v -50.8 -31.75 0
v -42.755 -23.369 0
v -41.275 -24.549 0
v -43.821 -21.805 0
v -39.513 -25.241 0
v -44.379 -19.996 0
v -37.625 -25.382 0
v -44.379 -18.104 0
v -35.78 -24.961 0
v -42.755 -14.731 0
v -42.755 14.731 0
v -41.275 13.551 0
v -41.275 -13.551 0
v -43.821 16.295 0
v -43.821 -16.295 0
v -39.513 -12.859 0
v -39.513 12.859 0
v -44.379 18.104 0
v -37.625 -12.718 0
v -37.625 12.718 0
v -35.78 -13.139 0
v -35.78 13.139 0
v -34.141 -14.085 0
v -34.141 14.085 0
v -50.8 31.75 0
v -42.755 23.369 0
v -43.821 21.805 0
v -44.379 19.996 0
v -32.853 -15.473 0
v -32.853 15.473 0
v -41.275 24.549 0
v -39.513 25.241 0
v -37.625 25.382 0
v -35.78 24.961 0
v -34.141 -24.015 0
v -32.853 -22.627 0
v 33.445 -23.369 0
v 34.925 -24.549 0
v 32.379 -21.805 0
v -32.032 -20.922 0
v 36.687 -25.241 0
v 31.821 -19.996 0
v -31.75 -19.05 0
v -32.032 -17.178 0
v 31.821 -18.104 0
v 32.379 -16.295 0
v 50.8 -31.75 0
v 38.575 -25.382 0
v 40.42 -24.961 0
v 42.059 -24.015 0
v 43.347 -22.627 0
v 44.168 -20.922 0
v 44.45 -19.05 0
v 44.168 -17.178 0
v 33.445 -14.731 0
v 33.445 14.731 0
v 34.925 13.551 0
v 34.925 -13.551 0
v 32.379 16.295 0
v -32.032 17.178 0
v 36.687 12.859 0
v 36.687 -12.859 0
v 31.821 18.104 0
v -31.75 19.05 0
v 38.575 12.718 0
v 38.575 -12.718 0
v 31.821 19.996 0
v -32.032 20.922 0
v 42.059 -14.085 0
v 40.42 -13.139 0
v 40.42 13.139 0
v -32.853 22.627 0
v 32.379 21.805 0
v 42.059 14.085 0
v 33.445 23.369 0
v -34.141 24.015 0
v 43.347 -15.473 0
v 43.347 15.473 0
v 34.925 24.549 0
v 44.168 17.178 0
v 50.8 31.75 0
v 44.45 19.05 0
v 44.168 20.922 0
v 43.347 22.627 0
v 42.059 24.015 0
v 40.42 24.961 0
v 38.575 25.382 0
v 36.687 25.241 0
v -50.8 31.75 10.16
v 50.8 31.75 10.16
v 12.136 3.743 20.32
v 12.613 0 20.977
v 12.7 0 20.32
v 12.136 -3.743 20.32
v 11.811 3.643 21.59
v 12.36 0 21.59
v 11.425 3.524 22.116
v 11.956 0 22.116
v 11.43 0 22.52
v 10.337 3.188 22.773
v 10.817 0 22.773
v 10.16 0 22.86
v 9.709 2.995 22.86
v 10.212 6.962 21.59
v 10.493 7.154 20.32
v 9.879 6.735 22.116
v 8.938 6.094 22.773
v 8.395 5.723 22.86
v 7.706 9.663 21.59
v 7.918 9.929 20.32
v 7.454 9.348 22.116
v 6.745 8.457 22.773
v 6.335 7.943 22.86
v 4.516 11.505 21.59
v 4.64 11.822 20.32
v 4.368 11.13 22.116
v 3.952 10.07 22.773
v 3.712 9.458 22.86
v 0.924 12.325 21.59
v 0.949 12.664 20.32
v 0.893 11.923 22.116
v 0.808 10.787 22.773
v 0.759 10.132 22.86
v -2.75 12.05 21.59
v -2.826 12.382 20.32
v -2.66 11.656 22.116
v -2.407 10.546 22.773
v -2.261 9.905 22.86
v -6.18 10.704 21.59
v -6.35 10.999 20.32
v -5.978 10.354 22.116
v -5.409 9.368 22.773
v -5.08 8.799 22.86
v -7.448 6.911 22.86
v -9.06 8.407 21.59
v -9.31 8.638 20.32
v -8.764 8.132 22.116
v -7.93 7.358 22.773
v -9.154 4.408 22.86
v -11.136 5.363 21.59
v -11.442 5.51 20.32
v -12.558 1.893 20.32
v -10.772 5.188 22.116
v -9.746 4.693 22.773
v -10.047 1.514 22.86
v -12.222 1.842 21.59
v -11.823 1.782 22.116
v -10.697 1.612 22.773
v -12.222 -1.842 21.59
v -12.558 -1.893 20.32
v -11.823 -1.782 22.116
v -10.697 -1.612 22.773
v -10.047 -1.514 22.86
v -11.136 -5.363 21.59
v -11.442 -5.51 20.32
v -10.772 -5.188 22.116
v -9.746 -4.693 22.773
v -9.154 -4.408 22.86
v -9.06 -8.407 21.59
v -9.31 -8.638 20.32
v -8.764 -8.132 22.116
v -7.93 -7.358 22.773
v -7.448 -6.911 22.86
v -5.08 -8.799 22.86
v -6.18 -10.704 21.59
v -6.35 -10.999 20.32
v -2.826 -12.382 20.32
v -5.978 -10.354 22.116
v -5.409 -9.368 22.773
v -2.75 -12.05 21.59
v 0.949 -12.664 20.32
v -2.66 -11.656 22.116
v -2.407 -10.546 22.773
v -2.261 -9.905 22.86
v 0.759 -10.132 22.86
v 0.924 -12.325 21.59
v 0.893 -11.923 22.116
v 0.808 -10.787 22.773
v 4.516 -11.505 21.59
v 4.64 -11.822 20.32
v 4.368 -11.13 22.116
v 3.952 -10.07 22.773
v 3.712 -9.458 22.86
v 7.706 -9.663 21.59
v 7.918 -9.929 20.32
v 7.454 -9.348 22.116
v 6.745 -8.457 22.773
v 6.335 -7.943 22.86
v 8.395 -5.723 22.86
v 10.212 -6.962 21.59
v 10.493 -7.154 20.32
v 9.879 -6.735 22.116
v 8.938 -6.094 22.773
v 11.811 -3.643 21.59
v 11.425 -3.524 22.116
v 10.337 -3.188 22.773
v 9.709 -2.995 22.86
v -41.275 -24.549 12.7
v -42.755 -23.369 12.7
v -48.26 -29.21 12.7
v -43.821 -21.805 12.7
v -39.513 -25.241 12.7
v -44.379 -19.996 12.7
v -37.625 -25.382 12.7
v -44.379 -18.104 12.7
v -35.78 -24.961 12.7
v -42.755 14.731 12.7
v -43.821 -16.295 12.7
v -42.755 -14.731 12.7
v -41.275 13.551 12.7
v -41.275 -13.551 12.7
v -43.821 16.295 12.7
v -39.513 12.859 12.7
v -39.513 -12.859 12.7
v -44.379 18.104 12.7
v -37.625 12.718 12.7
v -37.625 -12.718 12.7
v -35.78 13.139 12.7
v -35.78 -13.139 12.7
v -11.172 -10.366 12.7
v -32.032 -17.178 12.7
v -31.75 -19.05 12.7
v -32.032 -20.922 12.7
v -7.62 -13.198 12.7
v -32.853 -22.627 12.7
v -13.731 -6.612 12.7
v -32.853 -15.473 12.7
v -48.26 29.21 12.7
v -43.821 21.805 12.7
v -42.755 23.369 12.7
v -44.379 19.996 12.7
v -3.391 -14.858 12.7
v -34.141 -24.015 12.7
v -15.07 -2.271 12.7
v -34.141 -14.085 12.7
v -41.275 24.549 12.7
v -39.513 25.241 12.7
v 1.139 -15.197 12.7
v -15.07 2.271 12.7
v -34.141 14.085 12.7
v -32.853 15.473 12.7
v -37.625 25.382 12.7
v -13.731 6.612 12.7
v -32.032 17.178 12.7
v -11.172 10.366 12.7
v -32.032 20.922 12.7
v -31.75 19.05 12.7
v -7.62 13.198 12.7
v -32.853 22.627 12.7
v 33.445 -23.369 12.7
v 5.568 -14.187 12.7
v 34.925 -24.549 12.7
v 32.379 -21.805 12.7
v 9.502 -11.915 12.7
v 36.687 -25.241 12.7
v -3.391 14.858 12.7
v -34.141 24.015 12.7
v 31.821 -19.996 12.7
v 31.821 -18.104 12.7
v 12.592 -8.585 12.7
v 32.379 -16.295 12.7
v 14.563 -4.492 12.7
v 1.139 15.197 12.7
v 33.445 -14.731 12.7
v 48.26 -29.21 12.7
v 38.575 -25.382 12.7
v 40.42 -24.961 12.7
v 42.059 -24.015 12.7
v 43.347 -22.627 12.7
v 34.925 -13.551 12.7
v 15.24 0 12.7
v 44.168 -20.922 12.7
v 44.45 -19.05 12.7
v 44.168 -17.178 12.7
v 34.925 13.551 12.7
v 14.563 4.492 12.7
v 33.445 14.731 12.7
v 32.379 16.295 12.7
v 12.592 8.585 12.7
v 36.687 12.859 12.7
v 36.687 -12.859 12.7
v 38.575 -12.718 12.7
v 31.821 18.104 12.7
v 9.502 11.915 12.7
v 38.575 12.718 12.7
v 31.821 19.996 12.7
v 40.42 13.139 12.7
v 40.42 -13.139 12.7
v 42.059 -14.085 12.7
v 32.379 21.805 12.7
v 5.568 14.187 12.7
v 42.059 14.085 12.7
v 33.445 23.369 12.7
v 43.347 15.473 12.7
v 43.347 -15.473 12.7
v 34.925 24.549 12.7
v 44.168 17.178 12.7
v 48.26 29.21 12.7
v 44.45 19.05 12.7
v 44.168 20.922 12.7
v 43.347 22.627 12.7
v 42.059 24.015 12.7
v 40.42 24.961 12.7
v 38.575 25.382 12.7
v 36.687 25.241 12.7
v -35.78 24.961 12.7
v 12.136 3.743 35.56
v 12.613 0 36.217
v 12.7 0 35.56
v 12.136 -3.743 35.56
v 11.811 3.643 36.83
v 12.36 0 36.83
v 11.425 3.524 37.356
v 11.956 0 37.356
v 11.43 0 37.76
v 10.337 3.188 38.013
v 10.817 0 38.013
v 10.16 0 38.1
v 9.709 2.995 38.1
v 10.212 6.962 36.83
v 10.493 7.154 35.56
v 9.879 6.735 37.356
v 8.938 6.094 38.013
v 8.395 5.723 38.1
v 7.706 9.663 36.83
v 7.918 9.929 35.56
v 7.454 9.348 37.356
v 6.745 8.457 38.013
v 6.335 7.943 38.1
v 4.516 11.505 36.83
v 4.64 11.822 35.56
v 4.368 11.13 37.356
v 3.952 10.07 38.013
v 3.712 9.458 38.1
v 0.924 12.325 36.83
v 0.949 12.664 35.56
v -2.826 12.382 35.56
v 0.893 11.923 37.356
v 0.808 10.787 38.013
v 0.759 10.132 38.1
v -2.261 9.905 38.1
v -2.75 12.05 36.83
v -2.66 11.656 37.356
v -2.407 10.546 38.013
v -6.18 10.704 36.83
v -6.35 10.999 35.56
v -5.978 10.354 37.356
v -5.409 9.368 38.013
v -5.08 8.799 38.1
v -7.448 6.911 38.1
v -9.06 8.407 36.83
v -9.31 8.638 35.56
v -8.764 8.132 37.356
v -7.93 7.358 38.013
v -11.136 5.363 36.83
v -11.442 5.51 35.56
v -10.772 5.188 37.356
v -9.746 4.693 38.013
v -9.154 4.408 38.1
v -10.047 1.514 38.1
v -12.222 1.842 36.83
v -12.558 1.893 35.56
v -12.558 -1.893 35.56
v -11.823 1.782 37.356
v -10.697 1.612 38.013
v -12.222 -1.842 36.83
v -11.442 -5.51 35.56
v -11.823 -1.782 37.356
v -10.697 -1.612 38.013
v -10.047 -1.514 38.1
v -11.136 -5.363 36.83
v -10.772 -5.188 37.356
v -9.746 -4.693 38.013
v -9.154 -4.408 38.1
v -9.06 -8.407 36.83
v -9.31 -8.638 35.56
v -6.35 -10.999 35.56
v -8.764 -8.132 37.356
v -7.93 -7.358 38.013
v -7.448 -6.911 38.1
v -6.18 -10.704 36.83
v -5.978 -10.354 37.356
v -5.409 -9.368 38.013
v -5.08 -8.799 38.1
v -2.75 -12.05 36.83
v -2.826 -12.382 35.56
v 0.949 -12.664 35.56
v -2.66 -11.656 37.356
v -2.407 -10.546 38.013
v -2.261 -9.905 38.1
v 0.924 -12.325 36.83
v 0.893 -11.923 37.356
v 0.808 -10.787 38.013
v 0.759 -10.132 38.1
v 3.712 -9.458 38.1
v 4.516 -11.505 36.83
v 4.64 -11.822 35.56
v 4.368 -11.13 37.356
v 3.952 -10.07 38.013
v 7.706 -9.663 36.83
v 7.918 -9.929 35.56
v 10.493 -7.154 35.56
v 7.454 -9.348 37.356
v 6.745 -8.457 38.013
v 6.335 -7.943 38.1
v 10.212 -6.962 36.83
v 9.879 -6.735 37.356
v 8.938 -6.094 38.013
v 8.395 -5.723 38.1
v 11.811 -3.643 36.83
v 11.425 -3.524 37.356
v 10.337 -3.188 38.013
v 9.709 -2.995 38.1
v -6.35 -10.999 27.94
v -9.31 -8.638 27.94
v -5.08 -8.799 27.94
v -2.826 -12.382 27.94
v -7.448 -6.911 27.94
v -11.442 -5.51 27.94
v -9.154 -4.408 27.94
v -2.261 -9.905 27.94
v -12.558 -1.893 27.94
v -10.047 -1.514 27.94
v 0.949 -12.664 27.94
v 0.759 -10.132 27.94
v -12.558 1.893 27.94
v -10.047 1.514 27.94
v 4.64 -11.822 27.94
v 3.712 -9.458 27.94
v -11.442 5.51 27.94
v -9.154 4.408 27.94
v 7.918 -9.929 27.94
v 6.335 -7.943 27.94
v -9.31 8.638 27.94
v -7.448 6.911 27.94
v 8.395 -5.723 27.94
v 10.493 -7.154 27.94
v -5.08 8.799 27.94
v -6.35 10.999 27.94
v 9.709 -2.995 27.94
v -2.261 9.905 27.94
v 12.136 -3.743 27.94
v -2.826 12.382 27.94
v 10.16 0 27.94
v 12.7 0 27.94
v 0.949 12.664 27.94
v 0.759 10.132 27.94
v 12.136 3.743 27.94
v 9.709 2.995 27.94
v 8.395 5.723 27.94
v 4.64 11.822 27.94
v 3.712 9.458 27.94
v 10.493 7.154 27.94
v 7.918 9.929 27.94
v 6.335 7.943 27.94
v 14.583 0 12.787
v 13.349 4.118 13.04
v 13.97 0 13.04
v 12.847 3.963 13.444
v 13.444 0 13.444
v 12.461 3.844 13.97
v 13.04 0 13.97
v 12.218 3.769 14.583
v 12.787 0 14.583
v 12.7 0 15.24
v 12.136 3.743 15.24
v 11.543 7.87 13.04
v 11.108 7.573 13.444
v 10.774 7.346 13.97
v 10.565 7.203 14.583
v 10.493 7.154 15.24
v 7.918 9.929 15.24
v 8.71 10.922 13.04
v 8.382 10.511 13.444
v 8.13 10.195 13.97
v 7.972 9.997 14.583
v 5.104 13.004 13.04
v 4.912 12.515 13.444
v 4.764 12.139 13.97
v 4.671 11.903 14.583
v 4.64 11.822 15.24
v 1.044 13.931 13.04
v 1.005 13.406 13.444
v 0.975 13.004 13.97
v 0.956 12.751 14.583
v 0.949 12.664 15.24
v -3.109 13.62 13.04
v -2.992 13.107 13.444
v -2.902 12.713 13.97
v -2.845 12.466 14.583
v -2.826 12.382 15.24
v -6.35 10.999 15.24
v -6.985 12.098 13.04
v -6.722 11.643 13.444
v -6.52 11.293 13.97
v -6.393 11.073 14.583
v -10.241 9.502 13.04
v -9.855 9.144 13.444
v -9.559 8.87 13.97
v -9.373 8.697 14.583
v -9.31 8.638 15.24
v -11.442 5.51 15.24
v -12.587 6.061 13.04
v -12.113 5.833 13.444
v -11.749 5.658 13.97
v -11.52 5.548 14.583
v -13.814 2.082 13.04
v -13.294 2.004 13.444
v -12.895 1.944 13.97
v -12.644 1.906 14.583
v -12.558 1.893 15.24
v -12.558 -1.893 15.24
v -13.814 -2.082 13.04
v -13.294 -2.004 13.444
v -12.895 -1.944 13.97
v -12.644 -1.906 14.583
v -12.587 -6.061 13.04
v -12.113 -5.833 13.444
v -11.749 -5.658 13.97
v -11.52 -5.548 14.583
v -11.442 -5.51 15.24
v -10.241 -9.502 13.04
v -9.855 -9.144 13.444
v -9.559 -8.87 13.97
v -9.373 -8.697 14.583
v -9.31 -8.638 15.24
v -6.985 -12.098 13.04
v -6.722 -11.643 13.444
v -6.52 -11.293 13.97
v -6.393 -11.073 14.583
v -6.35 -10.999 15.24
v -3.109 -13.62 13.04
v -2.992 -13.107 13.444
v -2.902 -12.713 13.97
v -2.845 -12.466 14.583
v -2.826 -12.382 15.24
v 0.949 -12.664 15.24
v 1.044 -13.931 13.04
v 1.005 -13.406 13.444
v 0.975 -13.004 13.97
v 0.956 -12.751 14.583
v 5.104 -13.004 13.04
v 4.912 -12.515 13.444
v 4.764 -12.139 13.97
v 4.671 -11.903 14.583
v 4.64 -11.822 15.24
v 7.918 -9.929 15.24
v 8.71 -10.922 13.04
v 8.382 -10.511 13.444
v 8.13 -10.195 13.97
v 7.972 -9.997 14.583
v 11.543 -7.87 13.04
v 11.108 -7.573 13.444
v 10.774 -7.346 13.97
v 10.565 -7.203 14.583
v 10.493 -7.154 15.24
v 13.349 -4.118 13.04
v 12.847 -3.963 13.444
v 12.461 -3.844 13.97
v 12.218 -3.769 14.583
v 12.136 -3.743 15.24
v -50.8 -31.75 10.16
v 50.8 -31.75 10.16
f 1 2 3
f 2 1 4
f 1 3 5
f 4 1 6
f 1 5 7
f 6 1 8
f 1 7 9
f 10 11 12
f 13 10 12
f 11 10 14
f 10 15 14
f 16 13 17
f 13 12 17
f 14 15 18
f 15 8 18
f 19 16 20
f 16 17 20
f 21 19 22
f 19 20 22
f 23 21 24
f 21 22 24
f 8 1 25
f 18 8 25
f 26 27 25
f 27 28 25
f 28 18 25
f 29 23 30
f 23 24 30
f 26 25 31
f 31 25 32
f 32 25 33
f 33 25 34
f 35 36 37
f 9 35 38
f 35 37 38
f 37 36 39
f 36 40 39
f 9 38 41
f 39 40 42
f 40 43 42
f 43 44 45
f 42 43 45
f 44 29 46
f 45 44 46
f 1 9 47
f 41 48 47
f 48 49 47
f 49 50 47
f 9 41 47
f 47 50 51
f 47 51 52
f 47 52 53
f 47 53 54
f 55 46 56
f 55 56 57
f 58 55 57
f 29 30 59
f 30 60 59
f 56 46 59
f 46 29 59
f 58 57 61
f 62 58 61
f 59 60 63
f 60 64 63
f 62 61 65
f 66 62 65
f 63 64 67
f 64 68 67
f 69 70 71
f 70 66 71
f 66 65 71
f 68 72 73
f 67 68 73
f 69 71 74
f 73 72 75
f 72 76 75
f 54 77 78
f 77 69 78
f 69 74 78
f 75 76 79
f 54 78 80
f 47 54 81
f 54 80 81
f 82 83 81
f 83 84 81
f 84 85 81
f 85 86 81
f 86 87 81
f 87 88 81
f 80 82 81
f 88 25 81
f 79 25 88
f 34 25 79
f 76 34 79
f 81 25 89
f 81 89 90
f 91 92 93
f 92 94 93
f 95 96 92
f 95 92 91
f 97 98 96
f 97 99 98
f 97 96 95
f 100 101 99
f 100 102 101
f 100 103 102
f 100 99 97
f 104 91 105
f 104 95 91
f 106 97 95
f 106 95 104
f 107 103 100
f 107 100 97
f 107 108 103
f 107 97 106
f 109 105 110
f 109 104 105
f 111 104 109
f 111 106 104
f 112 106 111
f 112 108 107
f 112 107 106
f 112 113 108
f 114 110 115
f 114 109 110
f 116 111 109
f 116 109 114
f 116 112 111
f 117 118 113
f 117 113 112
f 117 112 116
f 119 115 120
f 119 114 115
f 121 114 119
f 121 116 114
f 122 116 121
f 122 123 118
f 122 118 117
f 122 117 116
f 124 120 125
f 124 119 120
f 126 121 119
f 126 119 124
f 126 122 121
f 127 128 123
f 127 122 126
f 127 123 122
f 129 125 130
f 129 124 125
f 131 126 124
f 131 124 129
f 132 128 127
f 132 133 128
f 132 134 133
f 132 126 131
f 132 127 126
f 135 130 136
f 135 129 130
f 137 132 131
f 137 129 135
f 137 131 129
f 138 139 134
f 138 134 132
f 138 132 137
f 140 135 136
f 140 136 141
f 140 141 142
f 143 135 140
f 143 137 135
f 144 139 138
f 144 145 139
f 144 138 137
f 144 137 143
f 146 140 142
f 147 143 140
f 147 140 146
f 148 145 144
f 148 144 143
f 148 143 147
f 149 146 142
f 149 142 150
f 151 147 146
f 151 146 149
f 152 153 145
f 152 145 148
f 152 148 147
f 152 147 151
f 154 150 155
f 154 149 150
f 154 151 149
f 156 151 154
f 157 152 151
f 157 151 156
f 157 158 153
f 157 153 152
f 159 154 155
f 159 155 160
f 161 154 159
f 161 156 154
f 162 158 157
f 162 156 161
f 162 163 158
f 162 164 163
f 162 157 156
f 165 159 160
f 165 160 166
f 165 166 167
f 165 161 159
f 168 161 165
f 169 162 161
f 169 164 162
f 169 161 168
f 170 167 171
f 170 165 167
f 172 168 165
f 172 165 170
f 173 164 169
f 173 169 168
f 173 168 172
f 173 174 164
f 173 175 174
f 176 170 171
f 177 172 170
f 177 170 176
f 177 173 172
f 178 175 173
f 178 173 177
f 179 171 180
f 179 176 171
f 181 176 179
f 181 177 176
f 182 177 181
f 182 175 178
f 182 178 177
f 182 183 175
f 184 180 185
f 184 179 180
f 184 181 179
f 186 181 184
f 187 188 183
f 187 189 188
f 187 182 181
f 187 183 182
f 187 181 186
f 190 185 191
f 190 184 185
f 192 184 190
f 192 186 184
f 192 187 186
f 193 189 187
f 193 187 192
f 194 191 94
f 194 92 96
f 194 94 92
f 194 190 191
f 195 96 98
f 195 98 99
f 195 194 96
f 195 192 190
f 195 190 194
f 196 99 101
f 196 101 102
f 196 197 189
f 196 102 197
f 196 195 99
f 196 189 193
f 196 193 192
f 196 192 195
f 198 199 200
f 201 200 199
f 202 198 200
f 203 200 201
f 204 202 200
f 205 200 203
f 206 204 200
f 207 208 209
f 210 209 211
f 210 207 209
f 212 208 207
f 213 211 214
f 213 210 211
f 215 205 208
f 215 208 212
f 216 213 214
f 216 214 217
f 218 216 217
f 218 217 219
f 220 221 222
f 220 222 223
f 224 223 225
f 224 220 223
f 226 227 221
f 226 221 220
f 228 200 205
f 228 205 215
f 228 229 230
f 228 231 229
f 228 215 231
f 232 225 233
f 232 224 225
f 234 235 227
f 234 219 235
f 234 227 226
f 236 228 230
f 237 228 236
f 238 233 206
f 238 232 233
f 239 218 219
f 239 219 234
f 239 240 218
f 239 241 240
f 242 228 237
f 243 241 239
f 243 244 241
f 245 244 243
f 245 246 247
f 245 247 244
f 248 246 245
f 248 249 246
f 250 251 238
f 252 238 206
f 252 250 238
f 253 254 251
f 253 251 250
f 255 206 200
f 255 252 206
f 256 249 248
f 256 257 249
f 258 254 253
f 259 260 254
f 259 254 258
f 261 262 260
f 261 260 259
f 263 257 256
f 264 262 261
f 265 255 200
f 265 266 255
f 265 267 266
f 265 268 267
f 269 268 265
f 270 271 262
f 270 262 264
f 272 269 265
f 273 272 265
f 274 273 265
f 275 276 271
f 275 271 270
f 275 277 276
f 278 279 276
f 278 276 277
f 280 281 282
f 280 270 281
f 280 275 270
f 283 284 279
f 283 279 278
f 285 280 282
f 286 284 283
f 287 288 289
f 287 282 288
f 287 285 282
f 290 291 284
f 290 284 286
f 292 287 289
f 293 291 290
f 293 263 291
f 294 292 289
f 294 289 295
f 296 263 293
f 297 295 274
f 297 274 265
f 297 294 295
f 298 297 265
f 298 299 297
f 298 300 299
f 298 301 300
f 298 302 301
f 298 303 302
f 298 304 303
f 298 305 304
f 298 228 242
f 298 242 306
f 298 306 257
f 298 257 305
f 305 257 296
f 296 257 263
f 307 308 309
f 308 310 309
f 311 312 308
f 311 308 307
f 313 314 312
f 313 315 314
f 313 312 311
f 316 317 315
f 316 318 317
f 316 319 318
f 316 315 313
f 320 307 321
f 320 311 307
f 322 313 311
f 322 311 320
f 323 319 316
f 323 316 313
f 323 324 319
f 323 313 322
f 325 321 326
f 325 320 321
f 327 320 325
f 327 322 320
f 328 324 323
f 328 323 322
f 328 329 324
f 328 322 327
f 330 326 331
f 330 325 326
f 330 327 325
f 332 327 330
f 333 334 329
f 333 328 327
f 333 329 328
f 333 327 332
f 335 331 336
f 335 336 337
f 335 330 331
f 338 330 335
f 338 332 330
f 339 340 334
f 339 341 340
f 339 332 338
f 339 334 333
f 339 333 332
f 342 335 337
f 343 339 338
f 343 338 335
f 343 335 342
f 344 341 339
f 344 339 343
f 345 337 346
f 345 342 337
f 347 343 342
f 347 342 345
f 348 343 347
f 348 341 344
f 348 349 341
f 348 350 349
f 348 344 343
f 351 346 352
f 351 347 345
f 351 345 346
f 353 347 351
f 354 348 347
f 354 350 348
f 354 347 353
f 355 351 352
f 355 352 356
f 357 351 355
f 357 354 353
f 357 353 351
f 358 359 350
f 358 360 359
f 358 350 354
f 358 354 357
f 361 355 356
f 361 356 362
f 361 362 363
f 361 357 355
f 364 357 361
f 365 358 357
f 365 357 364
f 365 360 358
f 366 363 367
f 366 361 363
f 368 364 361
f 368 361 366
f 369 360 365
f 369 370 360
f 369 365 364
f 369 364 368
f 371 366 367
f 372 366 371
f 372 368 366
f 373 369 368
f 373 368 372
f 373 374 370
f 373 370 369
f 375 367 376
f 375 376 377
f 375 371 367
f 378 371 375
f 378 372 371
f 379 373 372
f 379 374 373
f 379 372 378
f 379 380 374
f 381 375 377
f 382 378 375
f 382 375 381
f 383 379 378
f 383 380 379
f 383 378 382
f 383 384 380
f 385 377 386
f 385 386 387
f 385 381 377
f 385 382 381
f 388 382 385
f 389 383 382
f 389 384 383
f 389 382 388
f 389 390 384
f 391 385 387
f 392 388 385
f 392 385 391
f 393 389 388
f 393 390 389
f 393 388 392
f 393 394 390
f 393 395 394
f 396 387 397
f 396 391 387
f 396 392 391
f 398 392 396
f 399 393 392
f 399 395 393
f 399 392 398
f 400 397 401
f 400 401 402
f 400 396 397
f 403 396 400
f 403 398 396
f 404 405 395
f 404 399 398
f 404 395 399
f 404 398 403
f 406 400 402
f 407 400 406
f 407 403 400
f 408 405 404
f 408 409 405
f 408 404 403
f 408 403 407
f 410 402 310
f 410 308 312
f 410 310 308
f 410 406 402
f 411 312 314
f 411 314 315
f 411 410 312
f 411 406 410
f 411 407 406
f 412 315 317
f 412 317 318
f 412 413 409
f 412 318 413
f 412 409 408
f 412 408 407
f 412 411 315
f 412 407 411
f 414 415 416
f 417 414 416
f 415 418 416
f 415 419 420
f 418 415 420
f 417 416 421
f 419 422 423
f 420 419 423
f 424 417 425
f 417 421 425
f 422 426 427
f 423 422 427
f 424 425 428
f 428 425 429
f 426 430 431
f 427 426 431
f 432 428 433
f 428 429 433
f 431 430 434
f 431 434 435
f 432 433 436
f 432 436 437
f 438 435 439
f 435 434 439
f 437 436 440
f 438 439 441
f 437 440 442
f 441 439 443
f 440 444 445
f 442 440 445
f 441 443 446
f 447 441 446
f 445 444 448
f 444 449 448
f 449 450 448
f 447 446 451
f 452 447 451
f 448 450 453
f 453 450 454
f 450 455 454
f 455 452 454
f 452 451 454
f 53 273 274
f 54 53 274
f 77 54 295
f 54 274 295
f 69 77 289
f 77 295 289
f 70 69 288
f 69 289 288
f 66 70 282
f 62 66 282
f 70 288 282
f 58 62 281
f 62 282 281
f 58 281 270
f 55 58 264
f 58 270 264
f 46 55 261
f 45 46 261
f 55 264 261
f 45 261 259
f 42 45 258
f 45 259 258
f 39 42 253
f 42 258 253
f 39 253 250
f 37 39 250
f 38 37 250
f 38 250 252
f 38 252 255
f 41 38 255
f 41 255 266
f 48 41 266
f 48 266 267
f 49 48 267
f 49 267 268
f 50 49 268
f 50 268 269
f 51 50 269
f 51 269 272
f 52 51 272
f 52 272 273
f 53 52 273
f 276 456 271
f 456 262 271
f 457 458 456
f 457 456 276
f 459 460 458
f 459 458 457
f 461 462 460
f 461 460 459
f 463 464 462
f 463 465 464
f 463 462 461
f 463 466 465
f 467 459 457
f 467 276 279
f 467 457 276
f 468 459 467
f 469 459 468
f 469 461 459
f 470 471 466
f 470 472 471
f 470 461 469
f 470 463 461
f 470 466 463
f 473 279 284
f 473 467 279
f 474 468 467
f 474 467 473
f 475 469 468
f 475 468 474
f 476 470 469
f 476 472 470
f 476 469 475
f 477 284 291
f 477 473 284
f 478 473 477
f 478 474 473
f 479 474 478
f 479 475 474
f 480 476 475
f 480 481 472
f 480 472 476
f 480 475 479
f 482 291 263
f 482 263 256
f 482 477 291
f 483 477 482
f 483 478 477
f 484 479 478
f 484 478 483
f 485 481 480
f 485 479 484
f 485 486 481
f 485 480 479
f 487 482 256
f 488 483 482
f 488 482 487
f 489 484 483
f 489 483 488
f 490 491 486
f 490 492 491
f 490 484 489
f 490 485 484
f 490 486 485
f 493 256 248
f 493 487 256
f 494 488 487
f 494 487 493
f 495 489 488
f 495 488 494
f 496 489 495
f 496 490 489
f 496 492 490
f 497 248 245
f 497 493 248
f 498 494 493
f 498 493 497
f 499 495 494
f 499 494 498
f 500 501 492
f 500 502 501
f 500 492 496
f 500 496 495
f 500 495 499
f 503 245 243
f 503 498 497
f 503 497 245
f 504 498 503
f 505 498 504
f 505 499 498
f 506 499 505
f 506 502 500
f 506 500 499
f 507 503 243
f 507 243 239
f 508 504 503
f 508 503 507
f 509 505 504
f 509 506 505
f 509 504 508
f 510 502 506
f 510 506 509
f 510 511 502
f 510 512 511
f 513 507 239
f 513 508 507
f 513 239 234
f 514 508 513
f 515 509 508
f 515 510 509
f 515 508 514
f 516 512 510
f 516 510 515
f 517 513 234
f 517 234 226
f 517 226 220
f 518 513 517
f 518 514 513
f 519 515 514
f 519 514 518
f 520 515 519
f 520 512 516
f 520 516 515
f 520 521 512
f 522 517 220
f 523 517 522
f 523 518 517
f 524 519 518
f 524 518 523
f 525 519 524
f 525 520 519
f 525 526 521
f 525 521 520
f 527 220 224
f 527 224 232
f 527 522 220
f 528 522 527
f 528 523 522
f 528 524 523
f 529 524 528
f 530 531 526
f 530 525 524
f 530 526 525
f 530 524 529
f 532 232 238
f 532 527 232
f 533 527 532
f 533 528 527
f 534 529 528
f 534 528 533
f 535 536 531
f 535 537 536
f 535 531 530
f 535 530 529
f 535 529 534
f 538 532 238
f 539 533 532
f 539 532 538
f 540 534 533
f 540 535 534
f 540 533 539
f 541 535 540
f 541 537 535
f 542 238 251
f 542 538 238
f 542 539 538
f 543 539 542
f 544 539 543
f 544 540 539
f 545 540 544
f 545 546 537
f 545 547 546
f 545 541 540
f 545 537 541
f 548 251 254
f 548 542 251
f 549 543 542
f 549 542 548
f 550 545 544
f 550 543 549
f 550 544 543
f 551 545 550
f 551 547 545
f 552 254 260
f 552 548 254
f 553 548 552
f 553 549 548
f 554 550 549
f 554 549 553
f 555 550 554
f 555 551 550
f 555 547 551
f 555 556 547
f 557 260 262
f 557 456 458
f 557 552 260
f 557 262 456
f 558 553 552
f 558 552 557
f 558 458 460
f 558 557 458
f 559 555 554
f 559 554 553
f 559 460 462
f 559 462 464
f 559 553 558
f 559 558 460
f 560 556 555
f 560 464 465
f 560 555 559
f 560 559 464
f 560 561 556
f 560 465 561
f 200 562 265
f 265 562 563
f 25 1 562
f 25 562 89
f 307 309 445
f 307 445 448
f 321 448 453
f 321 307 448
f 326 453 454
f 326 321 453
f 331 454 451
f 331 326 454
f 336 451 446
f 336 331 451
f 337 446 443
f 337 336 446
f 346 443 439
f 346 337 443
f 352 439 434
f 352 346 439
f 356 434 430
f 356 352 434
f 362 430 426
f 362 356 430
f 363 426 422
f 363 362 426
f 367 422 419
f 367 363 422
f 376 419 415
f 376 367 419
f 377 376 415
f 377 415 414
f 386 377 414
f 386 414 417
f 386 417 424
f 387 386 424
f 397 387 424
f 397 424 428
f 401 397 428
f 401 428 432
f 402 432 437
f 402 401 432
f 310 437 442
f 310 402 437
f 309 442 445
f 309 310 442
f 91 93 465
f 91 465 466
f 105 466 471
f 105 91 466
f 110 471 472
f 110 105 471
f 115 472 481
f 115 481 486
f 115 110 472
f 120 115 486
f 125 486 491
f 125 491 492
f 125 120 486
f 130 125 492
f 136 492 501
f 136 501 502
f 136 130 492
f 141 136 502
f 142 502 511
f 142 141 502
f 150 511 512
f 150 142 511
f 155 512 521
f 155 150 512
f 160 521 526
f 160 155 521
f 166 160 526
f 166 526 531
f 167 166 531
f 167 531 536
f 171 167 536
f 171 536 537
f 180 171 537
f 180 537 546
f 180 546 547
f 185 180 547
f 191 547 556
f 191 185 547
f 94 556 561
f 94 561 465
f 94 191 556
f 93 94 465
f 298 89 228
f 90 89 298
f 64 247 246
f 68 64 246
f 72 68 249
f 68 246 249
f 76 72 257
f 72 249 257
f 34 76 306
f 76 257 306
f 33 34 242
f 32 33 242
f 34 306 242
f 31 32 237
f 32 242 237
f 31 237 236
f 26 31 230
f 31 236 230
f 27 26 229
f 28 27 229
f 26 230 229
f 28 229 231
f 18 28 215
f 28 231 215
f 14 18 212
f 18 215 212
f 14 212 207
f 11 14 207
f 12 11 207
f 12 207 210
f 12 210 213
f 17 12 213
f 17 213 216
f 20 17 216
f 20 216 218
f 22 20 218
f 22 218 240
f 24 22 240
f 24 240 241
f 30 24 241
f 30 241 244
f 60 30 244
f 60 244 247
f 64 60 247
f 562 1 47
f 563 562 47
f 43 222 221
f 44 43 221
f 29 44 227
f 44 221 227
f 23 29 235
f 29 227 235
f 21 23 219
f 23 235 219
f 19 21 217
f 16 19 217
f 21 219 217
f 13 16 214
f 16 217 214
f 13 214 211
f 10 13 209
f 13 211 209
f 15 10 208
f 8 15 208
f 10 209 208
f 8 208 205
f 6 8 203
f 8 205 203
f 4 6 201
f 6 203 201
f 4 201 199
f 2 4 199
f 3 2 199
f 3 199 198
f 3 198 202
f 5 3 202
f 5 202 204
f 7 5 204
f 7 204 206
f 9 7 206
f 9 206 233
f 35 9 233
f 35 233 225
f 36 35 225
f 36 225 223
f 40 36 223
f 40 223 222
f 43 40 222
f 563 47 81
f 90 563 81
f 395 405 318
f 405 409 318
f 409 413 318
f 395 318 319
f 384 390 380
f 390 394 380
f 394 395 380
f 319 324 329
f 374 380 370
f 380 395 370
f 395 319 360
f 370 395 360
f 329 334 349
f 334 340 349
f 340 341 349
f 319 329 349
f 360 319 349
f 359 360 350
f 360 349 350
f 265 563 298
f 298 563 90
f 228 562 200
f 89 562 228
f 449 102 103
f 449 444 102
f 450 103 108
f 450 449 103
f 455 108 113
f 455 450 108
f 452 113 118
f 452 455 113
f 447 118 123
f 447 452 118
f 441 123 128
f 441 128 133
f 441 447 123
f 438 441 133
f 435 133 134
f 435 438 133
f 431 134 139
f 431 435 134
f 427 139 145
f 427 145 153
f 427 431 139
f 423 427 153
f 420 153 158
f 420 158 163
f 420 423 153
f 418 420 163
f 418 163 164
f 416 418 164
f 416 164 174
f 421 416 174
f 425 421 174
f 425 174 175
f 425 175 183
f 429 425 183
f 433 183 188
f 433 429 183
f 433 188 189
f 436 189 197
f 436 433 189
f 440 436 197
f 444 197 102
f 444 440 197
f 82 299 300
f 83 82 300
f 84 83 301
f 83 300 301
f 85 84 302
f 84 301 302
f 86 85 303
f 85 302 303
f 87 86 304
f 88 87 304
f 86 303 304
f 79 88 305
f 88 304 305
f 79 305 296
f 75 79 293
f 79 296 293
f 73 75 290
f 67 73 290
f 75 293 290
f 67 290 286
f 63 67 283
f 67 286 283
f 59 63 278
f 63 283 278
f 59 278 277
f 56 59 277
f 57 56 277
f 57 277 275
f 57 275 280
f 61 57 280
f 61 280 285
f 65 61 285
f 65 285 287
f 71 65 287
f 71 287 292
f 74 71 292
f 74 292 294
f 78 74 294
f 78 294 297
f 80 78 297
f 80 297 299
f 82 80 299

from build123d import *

# Parameters (mm, degrees)
F0_W     = 101.6
F0_H     = 63.5
F1_DEPTH = 12.7
F2_R     = 6.35
F3_DEPTH = 12.701
F4_W     = 12.7
F4_H     = 25.4
F6_W     = 4.7343277841
F6_H     = 5.08
F6_W_2   = 2.54
F8_R     = 2.53999
F9_R     = 2.54
F10_SIZE = 2.54


# Not quite as in the source:
# - a fillet or chamfer is up to 0.001 mm smaller than in the source, because OpenCascade refuses the exact size


with BuildPart() as f1:
    # F0 (on Top) → F1 (new body)
    with BuildSketch(Plane.XY):
        Rectangle(F0_W, F0_H)
    extrude(amount=F1_DEPTH)

    # F2 (on face) → F3 (cut, through all)
    with BuildSketch(Plane.XY.offset(12.7)):
        with Locations((-38.1, 19.05)):
            Circle(F2_R)
        with Locations((38.1, 19.05)):
            Circle(F2_R)
        with Locations((38.1, -19.05)):
            Circle(F2_R)
        with Locations((-38.1, -19.05)):
            Circle(F2_R)
    extrude(amount=-F3_DEPTH, mode=Mode.SUBTRACT)

    # F4 (on Front) → F5 (revolve)
    with BuildSketch(Plane.XZ):
        with Locations((6.35, 25.4)):
            Rectangle(F4_W, F4_H)
    revolve(axis=Axis((0, 0, 25.4), (0, 0, 1)))

    # F6 (on Front) → F7 (revolve, cut)
    with BuildSketch(Plane.XZ):
        with Locations((15.067163892, 25.4)):
            Rectangle(F6_W, F6_H)
        with Locations((11.43, 25.4)):
            Rectangle(F6_W_2, F6_H)
    revolve(axis=Axis((0, 0, 12.7), (0, 0, 1)), mode=Mode.SUBTRACT)

    # F8 (radius 2.54 in the source; OpenCascade refuses exactly that, so slightly less here)
    f8_edges = [f1.edges().sort_by_distance(p)[0] for p in [
        (-12.7, 0, 12.7),
        (-12.7, 0, 22.86),
    ]]
    fillet(f8_edges, radius=F8_R)

    # F9
    f9_edges = [f1.edges().sort_by_distance(p)[0] for p in [
        (-12.7, 0, 38.1),
    ]]
    fillet(f9_edges, radius=F9_R)

    # F10
    f10_edges = [f1.edges().sort_by_distance(p)[0] for p in [
        (-50.8, 0, 12.7),
        (0, -31.75, 12.7),
        (0, 31.75, 12.7),
        (50.8, 0, 12.7),
    ]]
    chamfer(f10_edges, length=F10_SIZE)


solid = f1.part
